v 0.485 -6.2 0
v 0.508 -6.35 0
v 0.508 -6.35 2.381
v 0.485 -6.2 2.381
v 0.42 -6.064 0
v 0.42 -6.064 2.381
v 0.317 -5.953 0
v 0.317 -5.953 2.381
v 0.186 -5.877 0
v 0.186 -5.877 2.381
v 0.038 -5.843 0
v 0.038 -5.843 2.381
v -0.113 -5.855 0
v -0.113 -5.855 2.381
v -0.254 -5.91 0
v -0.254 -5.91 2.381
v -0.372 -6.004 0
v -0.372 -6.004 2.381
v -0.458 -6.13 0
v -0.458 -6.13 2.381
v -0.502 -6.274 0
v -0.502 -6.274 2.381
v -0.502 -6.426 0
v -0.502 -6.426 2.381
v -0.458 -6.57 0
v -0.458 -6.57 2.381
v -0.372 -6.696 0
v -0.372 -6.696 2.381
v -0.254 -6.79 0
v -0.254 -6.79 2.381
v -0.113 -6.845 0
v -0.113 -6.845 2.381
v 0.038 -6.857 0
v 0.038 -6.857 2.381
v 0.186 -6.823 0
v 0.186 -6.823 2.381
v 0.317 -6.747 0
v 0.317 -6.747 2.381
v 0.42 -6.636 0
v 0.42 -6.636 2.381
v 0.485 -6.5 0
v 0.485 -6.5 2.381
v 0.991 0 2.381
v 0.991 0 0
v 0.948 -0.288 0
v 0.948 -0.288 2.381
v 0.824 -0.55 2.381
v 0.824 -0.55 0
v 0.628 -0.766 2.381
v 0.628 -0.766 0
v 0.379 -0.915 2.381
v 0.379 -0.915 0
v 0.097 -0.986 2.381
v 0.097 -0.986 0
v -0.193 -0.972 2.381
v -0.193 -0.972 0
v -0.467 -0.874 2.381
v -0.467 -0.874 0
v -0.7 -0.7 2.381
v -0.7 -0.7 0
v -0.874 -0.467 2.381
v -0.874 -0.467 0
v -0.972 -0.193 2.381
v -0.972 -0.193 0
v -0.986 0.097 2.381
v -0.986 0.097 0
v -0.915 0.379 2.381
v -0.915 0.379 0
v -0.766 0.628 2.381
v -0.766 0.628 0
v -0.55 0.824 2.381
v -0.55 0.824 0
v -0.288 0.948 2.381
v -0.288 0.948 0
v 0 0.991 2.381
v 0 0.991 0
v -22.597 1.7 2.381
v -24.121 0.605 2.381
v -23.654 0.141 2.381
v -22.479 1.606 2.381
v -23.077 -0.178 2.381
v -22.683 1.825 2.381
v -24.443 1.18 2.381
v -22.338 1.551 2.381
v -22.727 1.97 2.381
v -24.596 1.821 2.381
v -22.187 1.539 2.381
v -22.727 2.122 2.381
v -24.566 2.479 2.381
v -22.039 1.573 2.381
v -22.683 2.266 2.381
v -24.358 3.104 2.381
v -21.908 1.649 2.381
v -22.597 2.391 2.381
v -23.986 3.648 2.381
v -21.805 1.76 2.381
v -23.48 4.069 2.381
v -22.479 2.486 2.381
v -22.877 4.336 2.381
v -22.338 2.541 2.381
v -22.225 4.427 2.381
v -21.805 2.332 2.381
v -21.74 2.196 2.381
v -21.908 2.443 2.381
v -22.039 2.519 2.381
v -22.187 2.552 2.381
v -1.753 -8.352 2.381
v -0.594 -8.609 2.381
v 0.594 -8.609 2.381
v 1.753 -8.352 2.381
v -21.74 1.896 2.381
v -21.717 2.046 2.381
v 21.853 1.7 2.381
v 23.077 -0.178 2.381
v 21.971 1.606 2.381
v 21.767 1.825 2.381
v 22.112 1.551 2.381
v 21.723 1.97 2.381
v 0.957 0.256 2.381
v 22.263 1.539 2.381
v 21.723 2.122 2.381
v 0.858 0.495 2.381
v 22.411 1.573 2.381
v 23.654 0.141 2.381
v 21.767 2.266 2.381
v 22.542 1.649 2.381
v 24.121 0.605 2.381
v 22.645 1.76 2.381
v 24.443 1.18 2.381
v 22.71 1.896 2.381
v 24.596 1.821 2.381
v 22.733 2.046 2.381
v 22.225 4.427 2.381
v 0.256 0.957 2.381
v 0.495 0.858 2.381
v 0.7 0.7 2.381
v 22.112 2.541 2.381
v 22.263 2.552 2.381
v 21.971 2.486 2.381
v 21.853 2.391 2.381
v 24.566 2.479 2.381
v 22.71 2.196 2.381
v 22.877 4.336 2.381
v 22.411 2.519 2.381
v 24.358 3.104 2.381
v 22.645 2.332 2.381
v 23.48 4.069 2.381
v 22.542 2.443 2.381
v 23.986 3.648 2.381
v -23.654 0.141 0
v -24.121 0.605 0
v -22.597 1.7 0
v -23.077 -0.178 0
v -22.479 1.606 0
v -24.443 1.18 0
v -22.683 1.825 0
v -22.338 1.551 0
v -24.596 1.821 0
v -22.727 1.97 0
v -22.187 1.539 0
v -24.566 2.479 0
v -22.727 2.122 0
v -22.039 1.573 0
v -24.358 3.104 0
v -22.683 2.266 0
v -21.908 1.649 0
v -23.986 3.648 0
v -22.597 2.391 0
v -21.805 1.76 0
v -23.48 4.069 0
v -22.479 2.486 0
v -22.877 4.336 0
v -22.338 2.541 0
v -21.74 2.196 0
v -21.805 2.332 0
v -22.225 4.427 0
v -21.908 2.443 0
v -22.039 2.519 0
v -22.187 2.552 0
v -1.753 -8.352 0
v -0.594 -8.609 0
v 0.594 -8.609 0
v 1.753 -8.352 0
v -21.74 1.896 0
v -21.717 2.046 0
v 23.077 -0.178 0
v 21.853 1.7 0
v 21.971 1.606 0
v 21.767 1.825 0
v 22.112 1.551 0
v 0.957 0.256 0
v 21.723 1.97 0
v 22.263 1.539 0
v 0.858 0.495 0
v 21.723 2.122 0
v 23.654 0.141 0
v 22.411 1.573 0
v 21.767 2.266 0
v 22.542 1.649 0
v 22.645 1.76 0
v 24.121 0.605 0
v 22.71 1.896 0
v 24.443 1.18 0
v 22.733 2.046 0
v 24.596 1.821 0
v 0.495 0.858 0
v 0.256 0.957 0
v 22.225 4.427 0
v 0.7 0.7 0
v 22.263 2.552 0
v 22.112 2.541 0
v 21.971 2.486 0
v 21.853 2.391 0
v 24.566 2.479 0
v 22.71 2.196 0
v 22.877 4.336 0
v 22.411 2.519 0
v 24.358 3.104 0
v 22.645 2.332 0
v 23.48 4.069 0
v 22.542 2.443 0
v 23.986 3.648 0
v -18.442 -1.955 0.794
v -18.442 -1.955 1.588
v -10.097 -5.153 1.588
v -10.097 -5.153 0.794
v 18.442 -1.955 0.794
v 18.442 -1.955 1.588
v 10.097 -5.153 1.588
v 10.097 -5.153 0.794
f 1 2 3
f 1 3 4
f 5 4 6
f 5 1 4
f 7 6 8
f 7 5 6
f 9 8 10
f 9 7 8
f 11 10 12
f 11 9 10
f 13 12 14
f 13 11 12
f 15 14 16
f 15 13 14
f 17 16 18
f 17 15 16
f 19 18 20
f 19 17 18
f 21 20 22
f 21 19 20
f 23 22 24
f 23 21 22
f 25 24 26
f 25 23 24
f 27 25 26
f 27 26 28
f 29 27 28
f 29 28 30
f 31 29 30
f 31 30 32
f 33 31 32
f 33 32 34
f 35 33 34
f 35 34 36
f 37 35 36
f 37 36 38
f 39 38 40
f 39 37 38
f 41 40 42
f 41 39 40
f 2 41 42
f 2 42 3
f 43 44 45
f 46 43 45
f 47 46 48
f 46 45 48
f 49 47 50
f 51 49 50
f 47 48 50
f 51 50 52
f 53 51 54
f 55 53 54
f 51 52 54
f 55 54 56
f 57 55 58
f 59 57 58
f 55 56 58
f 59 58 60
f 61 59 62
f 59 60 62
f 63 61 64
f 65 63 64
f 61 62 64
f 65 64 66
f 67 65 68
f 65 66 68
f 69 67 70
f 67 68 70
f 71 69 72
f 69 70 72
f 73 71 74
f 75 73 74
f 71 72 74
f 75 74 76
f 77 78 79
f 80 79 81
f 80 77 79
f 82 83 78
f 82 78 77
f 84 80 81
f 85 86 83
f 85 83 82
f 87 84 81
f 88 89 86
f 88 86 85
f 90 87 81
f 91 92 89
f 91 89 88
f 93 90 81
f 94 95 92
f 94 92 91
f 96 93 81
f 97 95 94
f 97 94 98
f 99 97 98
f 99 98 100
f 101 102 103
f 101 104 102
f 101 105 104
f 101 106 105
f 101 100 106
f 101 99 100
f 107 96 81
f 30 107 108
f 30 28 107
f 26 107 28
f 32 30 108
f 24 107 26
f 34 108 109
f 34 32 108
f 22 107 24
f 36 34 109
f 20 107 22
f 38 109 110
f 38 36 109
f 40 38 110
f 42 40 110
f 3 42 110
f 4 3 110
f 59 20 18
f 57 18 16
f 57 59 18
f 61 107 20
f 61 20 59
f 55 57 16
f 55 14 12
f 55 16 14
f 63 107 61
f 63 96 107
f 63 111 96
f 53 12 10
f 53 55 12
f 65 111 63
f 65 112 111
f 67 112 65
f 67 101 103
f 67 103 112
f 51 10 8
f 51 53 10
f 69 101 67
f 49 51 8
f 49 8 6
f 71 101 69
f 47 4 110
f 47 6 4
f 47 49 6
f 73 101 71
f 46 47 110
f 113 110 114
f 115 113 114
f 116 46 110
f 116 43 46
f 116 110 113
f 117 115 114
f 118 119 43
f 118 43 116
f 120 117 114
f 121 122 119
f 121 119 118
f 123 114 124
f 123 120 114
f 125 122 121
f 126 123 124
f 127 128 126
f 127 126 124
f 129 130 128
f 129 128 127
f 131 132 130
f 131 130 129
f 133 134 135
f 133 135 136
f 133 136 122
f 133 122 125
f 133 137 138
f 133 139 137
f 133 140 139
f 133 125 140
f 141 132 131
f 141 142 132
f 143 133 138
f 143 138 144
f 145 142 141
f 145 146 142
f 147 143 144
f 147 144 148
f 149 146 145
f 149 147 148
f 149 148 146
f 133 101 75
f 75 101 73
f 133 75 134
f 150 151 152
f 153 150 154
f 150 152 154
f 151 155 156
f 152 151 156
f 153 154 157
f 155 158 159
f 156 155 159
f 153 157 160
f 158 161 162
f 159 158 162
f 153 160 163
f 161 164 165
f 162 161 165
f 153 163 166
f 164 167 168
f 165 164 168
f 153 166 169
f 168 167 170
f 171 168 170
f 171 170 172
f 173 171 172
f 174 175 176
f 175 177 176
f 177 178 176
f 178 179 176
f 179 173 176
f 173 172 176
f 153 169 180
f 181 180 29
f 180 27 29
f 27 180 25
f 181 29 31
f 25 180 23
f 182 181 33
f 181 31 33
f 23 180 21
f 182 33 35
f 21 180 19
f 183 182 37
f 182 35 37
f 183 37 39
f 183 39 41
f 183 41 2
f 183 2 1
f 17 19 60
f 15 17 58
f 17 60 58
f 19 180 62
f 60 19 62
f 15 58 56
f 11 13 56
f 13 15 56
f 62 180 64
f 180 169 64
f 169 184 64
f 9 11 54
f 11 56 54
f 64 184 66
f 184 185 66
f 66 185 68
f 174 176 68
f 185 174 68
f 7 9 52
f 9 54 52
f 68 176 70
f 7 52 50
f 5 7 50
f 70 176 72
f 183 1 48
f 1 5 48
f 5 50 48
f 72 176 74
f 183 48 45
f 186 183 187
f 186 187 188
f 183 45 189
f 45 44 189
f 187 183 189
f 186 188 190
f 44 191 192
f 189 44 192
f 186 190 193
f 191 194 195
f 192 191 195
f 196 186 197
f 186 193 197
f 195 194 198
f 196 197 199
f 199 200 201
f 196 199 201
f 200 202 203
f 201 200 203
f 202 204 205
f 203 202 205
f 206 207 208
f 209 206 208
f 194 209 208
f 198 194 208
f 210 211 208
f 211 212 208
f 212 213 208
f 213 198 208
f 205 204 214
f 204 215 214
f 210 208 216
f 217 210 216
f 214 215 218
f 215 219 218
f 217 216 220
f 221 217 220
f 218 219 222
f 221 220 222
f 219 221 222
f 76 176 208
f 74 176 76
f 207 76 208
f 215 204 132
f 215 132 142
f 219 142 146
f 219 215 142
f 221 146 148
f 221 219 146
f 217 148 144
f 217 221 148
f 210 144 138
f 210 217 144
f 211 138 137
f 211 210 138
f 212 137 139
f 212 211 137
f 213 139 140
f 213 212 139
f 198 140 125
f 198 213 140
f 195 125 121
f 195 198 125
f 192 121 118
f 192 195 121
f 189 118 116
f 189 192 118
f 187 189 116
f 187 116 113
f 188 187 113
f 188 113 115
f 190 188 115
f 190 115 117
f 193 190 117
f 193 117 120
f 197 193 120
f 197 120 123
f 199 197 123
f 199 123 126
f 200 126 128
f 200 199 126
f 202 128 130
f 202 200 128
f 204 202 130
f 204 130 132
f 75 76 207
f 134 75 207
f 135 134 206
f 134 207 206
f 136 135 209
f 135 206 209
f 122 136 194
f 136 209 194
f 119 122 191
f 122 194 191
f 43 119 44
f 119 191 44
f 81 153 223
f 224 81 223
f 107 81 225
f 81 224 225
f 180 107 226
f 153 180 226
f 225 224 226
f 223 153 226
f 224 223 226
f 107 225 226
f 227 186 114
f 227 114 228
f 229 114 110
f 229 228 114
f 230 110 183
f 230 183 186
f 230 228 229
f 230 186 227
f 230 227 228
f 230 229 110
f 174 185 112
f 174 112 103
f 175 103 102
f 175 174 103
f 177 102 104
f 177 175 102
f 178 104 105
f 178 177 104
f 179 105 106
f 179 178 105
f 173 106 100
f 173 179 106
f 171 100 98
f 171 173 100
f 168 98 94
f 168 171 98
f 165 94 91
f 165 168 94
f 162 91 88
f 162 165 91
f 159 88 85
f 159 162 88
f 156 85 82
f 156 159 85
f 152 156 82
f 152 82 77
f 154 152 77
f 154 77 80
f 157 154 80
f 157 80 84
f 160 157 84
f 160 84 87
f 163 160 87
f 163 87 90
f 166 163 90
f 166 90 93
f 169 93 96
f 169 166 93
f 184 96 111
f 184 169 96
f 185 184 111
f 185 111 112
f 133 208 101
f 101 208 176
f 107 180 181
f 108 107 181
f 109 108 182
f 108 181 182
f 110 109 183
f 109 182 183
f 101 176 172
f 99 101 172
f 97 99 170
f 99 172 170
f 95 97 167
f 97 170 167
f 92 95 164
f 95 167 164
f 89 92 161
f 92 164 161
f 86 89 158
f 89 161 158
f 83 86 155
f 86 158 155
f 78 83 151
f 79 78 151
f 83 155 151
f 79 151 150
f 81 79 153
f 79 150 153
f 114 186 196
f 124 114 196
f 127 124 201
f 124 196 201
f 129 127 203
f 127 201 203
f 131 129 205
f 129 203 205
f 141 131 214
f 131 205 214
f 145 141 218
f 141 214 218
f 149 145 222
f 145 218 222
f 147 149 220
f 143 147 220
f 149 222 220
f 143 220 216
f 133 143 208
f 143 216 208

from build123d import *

# Parameters (mm, degrees)
F0_R     = 0.508
F1_DEPTH = 2.38125


with BuildPart() as f1:
    # F0 (on Top) → F1 (new body)
    with BuildSketch(Plane.XY):
        with BuildLine():
            ThreePointArc((0.9906, 0), (0.70046, 0.70046), (0, 0.9906))
            ThreePointArc((0, 0.9906), (-0.70046, -0.70046), (0.9906, 0))
        make_face()
        with BuildLine():
            add(Edge.make_bspline(
                [(23.077335, -0.177674), (21.532068, -0.770026), (17.205456, -2.428561), (10.097499, -5.153278), (4.534809, -7.285642), (1.753464, -8.351825)],
                knots=[3.971353, 3.971353, 3.971353, 3.971353, 8.936086, 17.872172, 26.808257, 26.808257, 26.808257, 26.808257], degree=3))
            ThreePointArc((23.077335, -0.177674), (24.566476, 2.479216), (22.225, 4.427059))
            Line((22.225, 4.427059), (0, 4.427059))
            Line((0, 4.427059), (-22.225, 4.427059))
            ThreePointArc((-22.225, 4.427059), (-24.566476, 2.479216), (-23.077335, -0.177674))
            add(Edge.make_bspline(
                [(-23.077335, -0.177674), (-21.532068, -0.770026), (-17.205456, -2.428561), (-10.097499, -5.153278), (-4.534809, -7.285642), (-1.753464, -8.351825)],
                knots=[3.971353, 3.971353, 3.971353, 3.971353, 8.936086, 17.872172, 26.808257, 26.808257, 26.808257, 26.808257], degree=3))
            ThreePointArc((-1.753464, -8.351825), (0, -8.640989), (1.753464, -8.351825))
        make_face()
        with Locations((0, -6.35)):
            Circle(F0_R, mode=Mode.SUBTRACT)
        with BuildLine():
            ThreePointArc((0.9906, 0), (-0.70046, -0.70046), (0, 0.9906))
            ThreePointArc((0, 0.9906), (0.70046, 0.70046), (0.9906, 0))
        make_face(mode=Mode.SUBTRACT)
        with Locations((-22.225, 2.045809)):
            Circle(F0_R, mode=Mode.SUBTRACT)
        with Locations((22.225, 2.045809)):
            Circle(F0_R, mode=Mode.SUBTRACT)
    extrude(amount=F1_DEPTH)


solid = f1.part
